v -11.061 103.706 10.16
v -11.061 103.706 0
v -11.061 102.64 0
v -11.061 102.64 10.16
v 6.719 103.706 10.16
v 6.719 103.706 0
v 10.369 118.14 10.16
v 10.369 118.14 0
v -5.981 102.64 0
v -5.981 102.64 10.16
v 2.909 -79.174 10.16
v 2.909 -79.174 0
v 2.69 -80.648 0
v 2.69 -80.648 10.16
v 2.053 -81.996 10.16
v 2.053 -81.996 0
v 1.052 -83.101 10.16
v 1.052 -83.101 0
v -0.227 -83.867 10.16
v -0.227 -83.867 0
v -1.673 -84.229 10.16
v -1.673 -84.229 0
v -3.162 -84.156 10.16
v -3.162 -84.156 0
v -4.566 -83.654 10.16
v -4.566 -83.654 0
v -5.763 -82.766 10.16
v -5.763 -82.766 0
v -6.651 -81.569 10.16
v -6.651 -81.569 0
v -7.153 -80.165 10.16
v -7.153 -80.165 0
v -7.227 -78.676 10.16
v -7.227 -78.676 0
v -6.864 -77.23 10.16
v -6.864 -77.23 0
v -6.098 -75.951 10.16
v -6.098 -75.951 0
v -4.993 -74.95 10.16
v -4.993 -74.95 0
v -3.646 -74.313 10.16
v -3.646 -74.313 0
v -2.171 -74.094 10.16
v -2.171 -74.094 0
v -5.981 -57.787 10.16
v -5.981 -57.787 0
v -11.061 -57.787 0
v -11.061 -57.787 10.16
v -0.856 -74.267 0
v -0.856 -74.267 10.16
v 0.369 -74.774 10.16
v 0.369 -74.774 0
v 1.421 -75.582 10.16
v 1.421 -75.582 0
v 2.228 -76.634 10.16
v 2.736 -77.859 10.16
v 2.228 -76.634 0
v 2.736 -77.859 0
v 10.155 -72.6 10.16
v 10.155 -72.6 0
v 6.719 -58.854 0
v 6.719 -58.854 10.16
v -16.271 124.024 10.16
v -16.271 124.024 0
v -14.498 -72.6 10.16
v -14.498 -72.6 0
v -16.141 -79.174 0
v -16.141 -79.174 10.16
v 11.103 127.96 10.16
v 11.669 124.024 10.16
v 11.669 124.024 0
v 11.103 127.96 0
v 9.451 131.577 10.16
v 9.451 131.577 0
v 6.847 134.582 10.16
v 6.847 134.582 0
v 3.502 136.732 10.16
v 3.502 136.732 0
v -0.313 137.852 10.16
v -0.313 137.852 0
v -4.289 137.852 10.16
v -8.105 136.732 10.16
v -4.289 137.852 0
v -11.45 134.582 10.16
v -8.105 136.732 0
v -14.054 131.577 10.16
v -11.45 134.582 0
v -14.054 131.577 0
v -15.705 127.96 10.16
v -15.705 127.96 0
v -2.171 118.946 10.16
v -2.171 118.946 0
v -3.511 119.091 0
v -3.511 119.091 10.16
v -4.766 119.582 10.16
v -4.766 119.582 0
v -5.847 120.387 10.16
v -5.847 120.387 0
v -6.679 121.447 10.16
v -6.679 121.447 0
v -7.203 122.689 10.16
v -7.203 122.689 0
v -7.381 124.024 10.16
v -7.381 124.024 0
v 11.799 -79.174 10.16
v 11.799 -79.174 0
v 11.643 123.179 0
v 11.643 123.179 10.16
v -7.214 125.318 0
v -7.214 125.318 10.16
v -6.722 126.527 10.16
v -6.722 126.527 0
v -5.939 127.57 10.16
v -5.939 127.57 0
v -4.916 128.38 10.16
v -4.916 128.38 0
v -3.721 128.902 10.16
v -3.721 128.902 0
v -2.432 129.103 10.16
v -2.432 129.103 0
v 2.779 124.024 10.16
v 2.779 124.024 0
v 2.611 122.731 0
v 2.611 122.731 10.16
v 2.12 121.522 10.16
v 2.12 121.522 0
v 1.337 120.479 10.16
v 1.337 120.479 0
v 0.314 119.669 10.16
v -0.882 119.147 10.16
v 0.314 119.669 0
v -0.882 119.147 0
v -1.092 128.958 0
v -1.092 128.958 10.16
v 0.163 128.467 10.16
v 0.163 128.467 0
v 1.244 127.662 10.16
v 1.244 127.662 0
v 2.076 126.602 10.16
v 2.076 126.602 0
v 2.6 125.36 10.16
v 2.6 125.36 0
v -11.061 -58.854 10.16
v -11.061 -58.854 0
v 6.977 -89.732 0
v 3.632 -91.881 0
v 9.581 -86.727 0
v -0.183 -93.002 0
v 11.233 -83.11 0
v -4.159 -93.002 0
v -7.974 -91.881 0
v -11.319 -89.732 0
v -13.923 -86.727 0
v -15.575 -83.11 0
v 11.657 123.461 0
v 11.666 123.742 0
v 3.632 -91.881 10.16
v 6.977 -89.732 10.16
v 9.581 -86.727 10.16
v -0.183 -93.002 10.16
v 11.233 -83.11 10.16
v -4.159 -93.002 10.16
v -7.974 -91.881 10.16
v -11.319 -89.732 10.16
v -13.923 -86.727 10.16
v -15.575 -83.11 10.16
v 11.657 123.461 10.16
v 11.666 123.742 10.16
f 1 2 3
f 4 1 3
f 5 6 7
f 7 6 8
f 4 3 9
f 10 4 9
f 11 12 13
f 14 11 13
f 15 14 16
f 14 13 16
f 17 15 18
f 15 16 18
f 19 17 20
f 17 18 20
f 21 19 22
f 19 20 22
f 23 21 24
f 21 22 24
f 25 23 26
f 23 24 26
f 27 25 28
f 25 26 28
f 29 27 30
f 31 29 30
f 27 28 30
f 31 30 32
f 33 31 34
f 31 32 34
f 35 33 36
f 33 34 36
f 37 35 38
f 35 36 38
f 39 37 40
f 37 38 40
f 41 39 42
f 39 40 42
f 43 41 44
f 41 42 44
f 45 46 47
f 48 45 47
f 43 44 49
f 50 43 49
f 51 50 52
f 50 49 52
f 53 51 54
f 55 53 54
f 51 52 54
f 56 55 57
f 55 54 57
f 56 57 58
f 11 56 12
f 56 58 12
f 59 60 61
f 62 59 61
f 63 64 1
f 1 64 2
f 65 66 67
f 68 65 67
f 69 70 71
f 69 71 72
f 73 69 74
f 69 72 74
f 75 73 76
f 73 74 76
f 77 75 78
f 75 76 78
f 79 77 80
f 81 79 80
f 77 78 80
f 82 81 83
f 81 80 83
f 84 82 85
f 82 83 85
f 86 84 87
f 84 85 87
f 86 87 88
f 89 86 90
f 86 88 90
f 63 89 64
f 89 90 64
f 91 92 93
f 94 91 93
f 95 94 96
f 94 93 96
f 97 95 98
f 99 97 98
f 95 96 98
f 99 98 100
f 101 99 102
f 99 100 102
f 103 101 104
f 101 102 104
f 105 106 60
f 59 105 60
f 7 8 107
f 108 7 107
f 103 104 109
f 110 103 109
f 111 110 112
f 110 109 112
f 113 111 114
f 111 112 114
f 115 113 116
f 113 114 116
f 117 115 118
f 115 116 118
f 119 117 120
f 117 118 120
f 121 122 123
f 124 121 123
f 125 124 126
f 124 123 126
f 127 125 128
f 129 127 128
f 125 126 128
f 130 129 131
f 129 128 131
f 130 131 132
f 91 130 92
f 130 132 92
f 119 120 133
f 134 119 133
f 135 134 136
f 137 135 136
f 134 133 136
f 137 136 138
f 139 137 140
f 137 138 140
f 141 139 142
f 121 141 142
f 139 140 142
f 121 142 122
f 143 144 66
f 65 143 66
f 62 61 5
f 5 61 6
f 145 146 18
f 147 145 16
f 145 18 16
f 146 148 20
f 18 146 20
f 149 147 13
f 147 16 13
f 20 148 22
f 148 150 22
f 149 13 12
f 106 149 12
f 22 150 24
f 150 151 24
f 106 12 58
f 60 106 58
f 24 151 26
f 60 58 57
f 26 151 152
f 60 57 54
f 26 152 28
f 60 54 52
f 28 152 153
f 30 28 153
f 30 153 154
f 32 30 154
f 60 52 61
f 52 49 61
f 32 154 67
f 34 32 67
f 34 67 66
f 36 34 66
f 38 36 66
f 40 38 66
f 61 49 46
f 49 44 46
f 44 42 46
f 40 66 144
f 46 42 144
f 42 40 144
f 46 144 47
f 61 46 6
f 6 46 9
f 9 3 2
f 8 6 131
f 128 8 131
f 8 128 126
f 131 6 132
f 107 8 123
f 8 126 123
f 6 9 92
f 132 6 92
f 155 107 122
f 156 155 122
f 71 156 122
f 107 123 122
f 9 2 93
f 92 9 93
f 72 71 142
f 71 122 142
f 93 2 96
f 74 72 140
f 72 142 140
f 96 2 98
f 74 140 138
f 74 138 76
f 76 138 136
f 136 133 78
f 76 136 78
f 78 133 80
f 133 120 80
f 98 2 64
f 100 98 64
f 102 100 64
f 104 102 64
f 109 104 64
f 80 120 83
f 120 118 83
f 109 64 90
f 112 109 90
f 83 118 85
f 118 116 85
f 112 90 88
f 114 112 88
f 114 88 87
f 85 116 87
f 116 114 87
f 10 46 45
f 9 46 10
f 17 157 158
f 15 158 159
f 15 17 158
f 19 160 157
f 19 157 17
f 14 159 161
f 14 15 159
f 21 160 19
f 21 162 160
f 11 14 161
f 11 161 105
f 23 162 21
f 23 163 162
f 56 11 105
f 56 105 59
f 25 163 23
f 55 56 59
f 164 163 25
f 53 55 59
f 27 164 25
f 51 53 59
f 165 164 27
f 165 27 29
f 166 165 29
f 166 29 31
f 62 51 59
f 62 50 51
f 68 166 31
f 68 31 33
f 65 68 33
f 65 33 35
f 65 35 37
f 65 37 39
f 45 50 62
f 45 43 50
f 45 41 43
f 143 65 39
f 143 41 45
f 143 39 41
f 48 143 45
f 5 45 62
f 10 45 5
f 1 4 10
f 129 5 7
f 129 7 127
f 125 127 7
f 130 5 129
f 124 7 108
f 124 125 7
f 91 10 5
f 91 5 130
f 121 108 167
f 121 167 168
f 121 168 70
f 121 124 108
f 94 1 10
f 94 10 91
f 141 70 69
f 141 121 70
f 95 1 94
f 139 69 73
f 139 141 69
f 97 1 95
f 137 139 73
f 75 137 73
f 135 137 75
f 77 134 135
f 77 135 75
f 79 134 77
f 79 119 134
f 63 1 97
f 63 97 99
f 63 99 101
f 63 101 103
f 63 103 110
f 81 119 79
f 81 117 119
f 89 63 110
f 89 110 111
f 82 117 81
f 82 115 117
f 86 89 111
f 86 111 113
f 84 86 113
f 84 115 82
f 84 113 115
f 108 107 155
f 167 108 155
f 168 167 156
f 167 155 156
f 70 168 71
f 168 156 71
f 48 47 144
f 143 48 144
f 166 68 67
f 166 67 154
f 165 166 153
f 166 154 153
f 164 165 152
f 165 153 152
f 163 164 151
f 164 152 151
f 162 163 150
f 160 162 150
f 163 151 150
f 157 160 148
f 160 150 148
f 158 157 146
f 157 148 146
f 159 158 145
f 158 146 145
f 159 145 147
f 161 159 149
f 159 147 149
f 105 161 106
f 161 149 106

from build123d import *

# Parameters (mm, degrees)
F0_W     = 1.8361258607
F0_H     = 1.0668
F0_W_2   = 7.62
F0_H_2   = 160.4273358566
F1_DEPTH = 10.16
F2_DEPTH = 5.08


with BuildPart() as f1:
    # F0 (on Top) → F1 (new body)
    with BuildSketch(Plane.XY):
        Polygon((6.7189444143, 102.6402935386), (6.7189444143, 103.7061576819), (-2.1710555857, 103.7061576819), (-11.0610555857, 103.7061576819), (-11.0610555857, 102.6402935386), (-5.9810555857, 102.6402935386), (1.6389444143, 102.6402935386), align=None)
        with BuildLine():
            Line((-2.1710555857, 103.7061576819), (6.7189444143, 103.7061576819))
            Line((6.7189444143, 103.7061576819), (10.3688539856, 118.139948899))
            ThreePointArc((10.3688539856, 118.139948899), (5.2686232822, 112.2832362473), (-2.1710555857, 110.0550947226))
            Line((-2.1710555857, 110.0550947226), (-2.1710555857, 103.7061576819))
        make_face()
        with BuildLine():
            Line((-11.0610555857, 103.7061576819), (-2.1710555857, 103.7061576819))
            Line((-2.1710555857, 103.7061576819), (-2.1710555857, 110.0550947226))
            ThreePointArc((-2.1710555857, 110.0550947226), (-9.3601607133, 111.9690507219), (-14.5474187039, 117.301856235))
            Line((-14.5474187039, 117.301856235), (-11.0610555857, 103.7061576819))
        make_face()
        with BuildLine():
            ThreePointArc((-2.1710555857, 110.0550947226), (5.2686232822, 112.2832362473), (10.3688539856, 118.139948899))
            Line((10.3688539856, 118.139948899), (11.6430755059, 123.1789360379))
            ThreePointArc((11.6430755059, 123.1789360379), (11.6622834114, 123.6015178338), (11.668688004, 124.0244874534))
            Line((11.668688004, 124.0244874534), (2.778688004, 124.0244874534))
            ThreePointArc((2.778688004, 124.0244874534), (1.3365515641, 120.4787366559), (-2.1710555857, 118.9461576819))
            Line((-2.1710555857, 118.9461576819), (-2.1710555857, 110.0550947226))
        make_face()
        with Locations((5.8008814839, -58.3204423181)):
            Rectangle(F0_W, F0_H)
        with Locations((-2.1710555857, 22.4266256103)):
            Rectangle(F0_W_2, F0_H_2)
        with BuildLine():
            ThreePointArc((-14.5474187039, 117.301856235), (-9.3601607133, 111.9690507219), (-2.1710555857, 110.0550947226))
            Line((-2.1710555857, 110.0550947226), (-2.1710555857, 118.9461576819))
            ThreePointArc((-2.1710555857, 118.9461576819), (-5.8470627935, 120.3866238933), (-7.381311996, 124.0244874534))
            Line((-7.381311996, 124.0244874534), (-16.271311996, 124.0244874534))
            Line((-16.271311996, 124.0244874534), (-14.5474187039, 117.301856235))
        make_face()
        with BuildLine():
            Line((10.1554150025, -72.599724671), (6.7189444143, -58.8538423181))
            Line((6.7189444143, -58.8538423181), (4.8828185536, -58.8538423181))
            Line((4.8828185536, -58.8538423181), (-2.1710555857, -58.8538423181))
            Line((-2.1710555857, -58.8538423181), (-2.1710555857, -65.2038423181))
            ThreePointArc((-2.1710555857, -65.2038423181), (5.0164501176, -67.1946661459), (10.1554150025, -72.599724671))
        make_face()
        Polygon((4.8828185536, -58.8538423181), (4.8828185536, -57.7870423181), (1.6389444143, -57.7870423181), (-5.9810555857, -57.7870423181), (-11.0610555857, -57.7870423181), (-11.0610555857, -58.8538423181), (-2.1710555857, -58.8538423181), align=None)
        with BuildLine():
            Line((2.778688004, 124.0244874534), (11.668688004, 124.0244874534))
            ThreePointArc((11.668688004, 124.0244874534), (-2.301311996, 137.9944874534), (-16.271311996, 124.0244874534))
            Line((-16.271311996, 124.0244874534), (-7.381311996, 124.0244874534))
            ThreePointArc((-7.381311996, 124.0244874534), (-5.9391755561, 127.5702382509), (-2.4315684063, 129.1028172248))
            ThreePointArc((-2.4315684063, 129.1028172248), (1.2444388015, 127.6623510135), (2.778688004, 124.0244874534))
        make_face()
        with BuildLine():
            Line((11.7989444143, -79.1738423181), (10.1554150025, -72.599724671))
            ThreePointArc((10.1554150025, -72.599724671), (5.0164501176, -67.1946661459), (-2.1710555857, -65.2038423181))
            ThreePointArc((-2.1710555857, -65.2038423181), (-9.3585612891, -67.1946661459), (-14.497526174, -72.599724671))
            Line((-14.497526174, -72.599724671), (-16.1410555857, -79.1738423181))
            ThreePointArc((-16.1410555857, -79.1738423181), (-2.1710555857, -93.1438423181), (11.7989444143, -79.1738423181))
        make_face()
        with BuildLine():
            ThreePointArc((2.9089444143, -79.1738423181), (-5.7631580342, -82.7659447665), (-2.1710555857, -74.0938423181))
            ThreePointArc((-2.1710555857, -74.0938423181), (1.4210468627, -75.5817398696), (2.9089444143, -79.1738423181))
        make_face(mode=Mode.SUBTRACT)
        with BuildLine():
            Line((-2.1710555857, -65.2038423181), (-2.1710555857, -58.8538423181))
            Line((-2.1710555857, -58.8538423181), (-11.0610555857, -58.8538423181))
            Line((-11.0610555857, -58.8538423181), (-14.497526174, -72.599724671))
            ThreePointArc((-14.497526174, -72.599724671), (-9.3585612891, -67.1946661459), (-2.1710555857, -65.2038423181))
        make_face()
    extrude(amount=F1_DEPTH)

    # F2 (add): a face of the model
    f2_faces = [f1.faces().sort_by_distance(p)[0] for p in [
        (1.6389444143, 22.4266256103, 5.08),
    ]]
    extrude(f2_faces, amount=F2_DEPTH)


solid = f1.part
